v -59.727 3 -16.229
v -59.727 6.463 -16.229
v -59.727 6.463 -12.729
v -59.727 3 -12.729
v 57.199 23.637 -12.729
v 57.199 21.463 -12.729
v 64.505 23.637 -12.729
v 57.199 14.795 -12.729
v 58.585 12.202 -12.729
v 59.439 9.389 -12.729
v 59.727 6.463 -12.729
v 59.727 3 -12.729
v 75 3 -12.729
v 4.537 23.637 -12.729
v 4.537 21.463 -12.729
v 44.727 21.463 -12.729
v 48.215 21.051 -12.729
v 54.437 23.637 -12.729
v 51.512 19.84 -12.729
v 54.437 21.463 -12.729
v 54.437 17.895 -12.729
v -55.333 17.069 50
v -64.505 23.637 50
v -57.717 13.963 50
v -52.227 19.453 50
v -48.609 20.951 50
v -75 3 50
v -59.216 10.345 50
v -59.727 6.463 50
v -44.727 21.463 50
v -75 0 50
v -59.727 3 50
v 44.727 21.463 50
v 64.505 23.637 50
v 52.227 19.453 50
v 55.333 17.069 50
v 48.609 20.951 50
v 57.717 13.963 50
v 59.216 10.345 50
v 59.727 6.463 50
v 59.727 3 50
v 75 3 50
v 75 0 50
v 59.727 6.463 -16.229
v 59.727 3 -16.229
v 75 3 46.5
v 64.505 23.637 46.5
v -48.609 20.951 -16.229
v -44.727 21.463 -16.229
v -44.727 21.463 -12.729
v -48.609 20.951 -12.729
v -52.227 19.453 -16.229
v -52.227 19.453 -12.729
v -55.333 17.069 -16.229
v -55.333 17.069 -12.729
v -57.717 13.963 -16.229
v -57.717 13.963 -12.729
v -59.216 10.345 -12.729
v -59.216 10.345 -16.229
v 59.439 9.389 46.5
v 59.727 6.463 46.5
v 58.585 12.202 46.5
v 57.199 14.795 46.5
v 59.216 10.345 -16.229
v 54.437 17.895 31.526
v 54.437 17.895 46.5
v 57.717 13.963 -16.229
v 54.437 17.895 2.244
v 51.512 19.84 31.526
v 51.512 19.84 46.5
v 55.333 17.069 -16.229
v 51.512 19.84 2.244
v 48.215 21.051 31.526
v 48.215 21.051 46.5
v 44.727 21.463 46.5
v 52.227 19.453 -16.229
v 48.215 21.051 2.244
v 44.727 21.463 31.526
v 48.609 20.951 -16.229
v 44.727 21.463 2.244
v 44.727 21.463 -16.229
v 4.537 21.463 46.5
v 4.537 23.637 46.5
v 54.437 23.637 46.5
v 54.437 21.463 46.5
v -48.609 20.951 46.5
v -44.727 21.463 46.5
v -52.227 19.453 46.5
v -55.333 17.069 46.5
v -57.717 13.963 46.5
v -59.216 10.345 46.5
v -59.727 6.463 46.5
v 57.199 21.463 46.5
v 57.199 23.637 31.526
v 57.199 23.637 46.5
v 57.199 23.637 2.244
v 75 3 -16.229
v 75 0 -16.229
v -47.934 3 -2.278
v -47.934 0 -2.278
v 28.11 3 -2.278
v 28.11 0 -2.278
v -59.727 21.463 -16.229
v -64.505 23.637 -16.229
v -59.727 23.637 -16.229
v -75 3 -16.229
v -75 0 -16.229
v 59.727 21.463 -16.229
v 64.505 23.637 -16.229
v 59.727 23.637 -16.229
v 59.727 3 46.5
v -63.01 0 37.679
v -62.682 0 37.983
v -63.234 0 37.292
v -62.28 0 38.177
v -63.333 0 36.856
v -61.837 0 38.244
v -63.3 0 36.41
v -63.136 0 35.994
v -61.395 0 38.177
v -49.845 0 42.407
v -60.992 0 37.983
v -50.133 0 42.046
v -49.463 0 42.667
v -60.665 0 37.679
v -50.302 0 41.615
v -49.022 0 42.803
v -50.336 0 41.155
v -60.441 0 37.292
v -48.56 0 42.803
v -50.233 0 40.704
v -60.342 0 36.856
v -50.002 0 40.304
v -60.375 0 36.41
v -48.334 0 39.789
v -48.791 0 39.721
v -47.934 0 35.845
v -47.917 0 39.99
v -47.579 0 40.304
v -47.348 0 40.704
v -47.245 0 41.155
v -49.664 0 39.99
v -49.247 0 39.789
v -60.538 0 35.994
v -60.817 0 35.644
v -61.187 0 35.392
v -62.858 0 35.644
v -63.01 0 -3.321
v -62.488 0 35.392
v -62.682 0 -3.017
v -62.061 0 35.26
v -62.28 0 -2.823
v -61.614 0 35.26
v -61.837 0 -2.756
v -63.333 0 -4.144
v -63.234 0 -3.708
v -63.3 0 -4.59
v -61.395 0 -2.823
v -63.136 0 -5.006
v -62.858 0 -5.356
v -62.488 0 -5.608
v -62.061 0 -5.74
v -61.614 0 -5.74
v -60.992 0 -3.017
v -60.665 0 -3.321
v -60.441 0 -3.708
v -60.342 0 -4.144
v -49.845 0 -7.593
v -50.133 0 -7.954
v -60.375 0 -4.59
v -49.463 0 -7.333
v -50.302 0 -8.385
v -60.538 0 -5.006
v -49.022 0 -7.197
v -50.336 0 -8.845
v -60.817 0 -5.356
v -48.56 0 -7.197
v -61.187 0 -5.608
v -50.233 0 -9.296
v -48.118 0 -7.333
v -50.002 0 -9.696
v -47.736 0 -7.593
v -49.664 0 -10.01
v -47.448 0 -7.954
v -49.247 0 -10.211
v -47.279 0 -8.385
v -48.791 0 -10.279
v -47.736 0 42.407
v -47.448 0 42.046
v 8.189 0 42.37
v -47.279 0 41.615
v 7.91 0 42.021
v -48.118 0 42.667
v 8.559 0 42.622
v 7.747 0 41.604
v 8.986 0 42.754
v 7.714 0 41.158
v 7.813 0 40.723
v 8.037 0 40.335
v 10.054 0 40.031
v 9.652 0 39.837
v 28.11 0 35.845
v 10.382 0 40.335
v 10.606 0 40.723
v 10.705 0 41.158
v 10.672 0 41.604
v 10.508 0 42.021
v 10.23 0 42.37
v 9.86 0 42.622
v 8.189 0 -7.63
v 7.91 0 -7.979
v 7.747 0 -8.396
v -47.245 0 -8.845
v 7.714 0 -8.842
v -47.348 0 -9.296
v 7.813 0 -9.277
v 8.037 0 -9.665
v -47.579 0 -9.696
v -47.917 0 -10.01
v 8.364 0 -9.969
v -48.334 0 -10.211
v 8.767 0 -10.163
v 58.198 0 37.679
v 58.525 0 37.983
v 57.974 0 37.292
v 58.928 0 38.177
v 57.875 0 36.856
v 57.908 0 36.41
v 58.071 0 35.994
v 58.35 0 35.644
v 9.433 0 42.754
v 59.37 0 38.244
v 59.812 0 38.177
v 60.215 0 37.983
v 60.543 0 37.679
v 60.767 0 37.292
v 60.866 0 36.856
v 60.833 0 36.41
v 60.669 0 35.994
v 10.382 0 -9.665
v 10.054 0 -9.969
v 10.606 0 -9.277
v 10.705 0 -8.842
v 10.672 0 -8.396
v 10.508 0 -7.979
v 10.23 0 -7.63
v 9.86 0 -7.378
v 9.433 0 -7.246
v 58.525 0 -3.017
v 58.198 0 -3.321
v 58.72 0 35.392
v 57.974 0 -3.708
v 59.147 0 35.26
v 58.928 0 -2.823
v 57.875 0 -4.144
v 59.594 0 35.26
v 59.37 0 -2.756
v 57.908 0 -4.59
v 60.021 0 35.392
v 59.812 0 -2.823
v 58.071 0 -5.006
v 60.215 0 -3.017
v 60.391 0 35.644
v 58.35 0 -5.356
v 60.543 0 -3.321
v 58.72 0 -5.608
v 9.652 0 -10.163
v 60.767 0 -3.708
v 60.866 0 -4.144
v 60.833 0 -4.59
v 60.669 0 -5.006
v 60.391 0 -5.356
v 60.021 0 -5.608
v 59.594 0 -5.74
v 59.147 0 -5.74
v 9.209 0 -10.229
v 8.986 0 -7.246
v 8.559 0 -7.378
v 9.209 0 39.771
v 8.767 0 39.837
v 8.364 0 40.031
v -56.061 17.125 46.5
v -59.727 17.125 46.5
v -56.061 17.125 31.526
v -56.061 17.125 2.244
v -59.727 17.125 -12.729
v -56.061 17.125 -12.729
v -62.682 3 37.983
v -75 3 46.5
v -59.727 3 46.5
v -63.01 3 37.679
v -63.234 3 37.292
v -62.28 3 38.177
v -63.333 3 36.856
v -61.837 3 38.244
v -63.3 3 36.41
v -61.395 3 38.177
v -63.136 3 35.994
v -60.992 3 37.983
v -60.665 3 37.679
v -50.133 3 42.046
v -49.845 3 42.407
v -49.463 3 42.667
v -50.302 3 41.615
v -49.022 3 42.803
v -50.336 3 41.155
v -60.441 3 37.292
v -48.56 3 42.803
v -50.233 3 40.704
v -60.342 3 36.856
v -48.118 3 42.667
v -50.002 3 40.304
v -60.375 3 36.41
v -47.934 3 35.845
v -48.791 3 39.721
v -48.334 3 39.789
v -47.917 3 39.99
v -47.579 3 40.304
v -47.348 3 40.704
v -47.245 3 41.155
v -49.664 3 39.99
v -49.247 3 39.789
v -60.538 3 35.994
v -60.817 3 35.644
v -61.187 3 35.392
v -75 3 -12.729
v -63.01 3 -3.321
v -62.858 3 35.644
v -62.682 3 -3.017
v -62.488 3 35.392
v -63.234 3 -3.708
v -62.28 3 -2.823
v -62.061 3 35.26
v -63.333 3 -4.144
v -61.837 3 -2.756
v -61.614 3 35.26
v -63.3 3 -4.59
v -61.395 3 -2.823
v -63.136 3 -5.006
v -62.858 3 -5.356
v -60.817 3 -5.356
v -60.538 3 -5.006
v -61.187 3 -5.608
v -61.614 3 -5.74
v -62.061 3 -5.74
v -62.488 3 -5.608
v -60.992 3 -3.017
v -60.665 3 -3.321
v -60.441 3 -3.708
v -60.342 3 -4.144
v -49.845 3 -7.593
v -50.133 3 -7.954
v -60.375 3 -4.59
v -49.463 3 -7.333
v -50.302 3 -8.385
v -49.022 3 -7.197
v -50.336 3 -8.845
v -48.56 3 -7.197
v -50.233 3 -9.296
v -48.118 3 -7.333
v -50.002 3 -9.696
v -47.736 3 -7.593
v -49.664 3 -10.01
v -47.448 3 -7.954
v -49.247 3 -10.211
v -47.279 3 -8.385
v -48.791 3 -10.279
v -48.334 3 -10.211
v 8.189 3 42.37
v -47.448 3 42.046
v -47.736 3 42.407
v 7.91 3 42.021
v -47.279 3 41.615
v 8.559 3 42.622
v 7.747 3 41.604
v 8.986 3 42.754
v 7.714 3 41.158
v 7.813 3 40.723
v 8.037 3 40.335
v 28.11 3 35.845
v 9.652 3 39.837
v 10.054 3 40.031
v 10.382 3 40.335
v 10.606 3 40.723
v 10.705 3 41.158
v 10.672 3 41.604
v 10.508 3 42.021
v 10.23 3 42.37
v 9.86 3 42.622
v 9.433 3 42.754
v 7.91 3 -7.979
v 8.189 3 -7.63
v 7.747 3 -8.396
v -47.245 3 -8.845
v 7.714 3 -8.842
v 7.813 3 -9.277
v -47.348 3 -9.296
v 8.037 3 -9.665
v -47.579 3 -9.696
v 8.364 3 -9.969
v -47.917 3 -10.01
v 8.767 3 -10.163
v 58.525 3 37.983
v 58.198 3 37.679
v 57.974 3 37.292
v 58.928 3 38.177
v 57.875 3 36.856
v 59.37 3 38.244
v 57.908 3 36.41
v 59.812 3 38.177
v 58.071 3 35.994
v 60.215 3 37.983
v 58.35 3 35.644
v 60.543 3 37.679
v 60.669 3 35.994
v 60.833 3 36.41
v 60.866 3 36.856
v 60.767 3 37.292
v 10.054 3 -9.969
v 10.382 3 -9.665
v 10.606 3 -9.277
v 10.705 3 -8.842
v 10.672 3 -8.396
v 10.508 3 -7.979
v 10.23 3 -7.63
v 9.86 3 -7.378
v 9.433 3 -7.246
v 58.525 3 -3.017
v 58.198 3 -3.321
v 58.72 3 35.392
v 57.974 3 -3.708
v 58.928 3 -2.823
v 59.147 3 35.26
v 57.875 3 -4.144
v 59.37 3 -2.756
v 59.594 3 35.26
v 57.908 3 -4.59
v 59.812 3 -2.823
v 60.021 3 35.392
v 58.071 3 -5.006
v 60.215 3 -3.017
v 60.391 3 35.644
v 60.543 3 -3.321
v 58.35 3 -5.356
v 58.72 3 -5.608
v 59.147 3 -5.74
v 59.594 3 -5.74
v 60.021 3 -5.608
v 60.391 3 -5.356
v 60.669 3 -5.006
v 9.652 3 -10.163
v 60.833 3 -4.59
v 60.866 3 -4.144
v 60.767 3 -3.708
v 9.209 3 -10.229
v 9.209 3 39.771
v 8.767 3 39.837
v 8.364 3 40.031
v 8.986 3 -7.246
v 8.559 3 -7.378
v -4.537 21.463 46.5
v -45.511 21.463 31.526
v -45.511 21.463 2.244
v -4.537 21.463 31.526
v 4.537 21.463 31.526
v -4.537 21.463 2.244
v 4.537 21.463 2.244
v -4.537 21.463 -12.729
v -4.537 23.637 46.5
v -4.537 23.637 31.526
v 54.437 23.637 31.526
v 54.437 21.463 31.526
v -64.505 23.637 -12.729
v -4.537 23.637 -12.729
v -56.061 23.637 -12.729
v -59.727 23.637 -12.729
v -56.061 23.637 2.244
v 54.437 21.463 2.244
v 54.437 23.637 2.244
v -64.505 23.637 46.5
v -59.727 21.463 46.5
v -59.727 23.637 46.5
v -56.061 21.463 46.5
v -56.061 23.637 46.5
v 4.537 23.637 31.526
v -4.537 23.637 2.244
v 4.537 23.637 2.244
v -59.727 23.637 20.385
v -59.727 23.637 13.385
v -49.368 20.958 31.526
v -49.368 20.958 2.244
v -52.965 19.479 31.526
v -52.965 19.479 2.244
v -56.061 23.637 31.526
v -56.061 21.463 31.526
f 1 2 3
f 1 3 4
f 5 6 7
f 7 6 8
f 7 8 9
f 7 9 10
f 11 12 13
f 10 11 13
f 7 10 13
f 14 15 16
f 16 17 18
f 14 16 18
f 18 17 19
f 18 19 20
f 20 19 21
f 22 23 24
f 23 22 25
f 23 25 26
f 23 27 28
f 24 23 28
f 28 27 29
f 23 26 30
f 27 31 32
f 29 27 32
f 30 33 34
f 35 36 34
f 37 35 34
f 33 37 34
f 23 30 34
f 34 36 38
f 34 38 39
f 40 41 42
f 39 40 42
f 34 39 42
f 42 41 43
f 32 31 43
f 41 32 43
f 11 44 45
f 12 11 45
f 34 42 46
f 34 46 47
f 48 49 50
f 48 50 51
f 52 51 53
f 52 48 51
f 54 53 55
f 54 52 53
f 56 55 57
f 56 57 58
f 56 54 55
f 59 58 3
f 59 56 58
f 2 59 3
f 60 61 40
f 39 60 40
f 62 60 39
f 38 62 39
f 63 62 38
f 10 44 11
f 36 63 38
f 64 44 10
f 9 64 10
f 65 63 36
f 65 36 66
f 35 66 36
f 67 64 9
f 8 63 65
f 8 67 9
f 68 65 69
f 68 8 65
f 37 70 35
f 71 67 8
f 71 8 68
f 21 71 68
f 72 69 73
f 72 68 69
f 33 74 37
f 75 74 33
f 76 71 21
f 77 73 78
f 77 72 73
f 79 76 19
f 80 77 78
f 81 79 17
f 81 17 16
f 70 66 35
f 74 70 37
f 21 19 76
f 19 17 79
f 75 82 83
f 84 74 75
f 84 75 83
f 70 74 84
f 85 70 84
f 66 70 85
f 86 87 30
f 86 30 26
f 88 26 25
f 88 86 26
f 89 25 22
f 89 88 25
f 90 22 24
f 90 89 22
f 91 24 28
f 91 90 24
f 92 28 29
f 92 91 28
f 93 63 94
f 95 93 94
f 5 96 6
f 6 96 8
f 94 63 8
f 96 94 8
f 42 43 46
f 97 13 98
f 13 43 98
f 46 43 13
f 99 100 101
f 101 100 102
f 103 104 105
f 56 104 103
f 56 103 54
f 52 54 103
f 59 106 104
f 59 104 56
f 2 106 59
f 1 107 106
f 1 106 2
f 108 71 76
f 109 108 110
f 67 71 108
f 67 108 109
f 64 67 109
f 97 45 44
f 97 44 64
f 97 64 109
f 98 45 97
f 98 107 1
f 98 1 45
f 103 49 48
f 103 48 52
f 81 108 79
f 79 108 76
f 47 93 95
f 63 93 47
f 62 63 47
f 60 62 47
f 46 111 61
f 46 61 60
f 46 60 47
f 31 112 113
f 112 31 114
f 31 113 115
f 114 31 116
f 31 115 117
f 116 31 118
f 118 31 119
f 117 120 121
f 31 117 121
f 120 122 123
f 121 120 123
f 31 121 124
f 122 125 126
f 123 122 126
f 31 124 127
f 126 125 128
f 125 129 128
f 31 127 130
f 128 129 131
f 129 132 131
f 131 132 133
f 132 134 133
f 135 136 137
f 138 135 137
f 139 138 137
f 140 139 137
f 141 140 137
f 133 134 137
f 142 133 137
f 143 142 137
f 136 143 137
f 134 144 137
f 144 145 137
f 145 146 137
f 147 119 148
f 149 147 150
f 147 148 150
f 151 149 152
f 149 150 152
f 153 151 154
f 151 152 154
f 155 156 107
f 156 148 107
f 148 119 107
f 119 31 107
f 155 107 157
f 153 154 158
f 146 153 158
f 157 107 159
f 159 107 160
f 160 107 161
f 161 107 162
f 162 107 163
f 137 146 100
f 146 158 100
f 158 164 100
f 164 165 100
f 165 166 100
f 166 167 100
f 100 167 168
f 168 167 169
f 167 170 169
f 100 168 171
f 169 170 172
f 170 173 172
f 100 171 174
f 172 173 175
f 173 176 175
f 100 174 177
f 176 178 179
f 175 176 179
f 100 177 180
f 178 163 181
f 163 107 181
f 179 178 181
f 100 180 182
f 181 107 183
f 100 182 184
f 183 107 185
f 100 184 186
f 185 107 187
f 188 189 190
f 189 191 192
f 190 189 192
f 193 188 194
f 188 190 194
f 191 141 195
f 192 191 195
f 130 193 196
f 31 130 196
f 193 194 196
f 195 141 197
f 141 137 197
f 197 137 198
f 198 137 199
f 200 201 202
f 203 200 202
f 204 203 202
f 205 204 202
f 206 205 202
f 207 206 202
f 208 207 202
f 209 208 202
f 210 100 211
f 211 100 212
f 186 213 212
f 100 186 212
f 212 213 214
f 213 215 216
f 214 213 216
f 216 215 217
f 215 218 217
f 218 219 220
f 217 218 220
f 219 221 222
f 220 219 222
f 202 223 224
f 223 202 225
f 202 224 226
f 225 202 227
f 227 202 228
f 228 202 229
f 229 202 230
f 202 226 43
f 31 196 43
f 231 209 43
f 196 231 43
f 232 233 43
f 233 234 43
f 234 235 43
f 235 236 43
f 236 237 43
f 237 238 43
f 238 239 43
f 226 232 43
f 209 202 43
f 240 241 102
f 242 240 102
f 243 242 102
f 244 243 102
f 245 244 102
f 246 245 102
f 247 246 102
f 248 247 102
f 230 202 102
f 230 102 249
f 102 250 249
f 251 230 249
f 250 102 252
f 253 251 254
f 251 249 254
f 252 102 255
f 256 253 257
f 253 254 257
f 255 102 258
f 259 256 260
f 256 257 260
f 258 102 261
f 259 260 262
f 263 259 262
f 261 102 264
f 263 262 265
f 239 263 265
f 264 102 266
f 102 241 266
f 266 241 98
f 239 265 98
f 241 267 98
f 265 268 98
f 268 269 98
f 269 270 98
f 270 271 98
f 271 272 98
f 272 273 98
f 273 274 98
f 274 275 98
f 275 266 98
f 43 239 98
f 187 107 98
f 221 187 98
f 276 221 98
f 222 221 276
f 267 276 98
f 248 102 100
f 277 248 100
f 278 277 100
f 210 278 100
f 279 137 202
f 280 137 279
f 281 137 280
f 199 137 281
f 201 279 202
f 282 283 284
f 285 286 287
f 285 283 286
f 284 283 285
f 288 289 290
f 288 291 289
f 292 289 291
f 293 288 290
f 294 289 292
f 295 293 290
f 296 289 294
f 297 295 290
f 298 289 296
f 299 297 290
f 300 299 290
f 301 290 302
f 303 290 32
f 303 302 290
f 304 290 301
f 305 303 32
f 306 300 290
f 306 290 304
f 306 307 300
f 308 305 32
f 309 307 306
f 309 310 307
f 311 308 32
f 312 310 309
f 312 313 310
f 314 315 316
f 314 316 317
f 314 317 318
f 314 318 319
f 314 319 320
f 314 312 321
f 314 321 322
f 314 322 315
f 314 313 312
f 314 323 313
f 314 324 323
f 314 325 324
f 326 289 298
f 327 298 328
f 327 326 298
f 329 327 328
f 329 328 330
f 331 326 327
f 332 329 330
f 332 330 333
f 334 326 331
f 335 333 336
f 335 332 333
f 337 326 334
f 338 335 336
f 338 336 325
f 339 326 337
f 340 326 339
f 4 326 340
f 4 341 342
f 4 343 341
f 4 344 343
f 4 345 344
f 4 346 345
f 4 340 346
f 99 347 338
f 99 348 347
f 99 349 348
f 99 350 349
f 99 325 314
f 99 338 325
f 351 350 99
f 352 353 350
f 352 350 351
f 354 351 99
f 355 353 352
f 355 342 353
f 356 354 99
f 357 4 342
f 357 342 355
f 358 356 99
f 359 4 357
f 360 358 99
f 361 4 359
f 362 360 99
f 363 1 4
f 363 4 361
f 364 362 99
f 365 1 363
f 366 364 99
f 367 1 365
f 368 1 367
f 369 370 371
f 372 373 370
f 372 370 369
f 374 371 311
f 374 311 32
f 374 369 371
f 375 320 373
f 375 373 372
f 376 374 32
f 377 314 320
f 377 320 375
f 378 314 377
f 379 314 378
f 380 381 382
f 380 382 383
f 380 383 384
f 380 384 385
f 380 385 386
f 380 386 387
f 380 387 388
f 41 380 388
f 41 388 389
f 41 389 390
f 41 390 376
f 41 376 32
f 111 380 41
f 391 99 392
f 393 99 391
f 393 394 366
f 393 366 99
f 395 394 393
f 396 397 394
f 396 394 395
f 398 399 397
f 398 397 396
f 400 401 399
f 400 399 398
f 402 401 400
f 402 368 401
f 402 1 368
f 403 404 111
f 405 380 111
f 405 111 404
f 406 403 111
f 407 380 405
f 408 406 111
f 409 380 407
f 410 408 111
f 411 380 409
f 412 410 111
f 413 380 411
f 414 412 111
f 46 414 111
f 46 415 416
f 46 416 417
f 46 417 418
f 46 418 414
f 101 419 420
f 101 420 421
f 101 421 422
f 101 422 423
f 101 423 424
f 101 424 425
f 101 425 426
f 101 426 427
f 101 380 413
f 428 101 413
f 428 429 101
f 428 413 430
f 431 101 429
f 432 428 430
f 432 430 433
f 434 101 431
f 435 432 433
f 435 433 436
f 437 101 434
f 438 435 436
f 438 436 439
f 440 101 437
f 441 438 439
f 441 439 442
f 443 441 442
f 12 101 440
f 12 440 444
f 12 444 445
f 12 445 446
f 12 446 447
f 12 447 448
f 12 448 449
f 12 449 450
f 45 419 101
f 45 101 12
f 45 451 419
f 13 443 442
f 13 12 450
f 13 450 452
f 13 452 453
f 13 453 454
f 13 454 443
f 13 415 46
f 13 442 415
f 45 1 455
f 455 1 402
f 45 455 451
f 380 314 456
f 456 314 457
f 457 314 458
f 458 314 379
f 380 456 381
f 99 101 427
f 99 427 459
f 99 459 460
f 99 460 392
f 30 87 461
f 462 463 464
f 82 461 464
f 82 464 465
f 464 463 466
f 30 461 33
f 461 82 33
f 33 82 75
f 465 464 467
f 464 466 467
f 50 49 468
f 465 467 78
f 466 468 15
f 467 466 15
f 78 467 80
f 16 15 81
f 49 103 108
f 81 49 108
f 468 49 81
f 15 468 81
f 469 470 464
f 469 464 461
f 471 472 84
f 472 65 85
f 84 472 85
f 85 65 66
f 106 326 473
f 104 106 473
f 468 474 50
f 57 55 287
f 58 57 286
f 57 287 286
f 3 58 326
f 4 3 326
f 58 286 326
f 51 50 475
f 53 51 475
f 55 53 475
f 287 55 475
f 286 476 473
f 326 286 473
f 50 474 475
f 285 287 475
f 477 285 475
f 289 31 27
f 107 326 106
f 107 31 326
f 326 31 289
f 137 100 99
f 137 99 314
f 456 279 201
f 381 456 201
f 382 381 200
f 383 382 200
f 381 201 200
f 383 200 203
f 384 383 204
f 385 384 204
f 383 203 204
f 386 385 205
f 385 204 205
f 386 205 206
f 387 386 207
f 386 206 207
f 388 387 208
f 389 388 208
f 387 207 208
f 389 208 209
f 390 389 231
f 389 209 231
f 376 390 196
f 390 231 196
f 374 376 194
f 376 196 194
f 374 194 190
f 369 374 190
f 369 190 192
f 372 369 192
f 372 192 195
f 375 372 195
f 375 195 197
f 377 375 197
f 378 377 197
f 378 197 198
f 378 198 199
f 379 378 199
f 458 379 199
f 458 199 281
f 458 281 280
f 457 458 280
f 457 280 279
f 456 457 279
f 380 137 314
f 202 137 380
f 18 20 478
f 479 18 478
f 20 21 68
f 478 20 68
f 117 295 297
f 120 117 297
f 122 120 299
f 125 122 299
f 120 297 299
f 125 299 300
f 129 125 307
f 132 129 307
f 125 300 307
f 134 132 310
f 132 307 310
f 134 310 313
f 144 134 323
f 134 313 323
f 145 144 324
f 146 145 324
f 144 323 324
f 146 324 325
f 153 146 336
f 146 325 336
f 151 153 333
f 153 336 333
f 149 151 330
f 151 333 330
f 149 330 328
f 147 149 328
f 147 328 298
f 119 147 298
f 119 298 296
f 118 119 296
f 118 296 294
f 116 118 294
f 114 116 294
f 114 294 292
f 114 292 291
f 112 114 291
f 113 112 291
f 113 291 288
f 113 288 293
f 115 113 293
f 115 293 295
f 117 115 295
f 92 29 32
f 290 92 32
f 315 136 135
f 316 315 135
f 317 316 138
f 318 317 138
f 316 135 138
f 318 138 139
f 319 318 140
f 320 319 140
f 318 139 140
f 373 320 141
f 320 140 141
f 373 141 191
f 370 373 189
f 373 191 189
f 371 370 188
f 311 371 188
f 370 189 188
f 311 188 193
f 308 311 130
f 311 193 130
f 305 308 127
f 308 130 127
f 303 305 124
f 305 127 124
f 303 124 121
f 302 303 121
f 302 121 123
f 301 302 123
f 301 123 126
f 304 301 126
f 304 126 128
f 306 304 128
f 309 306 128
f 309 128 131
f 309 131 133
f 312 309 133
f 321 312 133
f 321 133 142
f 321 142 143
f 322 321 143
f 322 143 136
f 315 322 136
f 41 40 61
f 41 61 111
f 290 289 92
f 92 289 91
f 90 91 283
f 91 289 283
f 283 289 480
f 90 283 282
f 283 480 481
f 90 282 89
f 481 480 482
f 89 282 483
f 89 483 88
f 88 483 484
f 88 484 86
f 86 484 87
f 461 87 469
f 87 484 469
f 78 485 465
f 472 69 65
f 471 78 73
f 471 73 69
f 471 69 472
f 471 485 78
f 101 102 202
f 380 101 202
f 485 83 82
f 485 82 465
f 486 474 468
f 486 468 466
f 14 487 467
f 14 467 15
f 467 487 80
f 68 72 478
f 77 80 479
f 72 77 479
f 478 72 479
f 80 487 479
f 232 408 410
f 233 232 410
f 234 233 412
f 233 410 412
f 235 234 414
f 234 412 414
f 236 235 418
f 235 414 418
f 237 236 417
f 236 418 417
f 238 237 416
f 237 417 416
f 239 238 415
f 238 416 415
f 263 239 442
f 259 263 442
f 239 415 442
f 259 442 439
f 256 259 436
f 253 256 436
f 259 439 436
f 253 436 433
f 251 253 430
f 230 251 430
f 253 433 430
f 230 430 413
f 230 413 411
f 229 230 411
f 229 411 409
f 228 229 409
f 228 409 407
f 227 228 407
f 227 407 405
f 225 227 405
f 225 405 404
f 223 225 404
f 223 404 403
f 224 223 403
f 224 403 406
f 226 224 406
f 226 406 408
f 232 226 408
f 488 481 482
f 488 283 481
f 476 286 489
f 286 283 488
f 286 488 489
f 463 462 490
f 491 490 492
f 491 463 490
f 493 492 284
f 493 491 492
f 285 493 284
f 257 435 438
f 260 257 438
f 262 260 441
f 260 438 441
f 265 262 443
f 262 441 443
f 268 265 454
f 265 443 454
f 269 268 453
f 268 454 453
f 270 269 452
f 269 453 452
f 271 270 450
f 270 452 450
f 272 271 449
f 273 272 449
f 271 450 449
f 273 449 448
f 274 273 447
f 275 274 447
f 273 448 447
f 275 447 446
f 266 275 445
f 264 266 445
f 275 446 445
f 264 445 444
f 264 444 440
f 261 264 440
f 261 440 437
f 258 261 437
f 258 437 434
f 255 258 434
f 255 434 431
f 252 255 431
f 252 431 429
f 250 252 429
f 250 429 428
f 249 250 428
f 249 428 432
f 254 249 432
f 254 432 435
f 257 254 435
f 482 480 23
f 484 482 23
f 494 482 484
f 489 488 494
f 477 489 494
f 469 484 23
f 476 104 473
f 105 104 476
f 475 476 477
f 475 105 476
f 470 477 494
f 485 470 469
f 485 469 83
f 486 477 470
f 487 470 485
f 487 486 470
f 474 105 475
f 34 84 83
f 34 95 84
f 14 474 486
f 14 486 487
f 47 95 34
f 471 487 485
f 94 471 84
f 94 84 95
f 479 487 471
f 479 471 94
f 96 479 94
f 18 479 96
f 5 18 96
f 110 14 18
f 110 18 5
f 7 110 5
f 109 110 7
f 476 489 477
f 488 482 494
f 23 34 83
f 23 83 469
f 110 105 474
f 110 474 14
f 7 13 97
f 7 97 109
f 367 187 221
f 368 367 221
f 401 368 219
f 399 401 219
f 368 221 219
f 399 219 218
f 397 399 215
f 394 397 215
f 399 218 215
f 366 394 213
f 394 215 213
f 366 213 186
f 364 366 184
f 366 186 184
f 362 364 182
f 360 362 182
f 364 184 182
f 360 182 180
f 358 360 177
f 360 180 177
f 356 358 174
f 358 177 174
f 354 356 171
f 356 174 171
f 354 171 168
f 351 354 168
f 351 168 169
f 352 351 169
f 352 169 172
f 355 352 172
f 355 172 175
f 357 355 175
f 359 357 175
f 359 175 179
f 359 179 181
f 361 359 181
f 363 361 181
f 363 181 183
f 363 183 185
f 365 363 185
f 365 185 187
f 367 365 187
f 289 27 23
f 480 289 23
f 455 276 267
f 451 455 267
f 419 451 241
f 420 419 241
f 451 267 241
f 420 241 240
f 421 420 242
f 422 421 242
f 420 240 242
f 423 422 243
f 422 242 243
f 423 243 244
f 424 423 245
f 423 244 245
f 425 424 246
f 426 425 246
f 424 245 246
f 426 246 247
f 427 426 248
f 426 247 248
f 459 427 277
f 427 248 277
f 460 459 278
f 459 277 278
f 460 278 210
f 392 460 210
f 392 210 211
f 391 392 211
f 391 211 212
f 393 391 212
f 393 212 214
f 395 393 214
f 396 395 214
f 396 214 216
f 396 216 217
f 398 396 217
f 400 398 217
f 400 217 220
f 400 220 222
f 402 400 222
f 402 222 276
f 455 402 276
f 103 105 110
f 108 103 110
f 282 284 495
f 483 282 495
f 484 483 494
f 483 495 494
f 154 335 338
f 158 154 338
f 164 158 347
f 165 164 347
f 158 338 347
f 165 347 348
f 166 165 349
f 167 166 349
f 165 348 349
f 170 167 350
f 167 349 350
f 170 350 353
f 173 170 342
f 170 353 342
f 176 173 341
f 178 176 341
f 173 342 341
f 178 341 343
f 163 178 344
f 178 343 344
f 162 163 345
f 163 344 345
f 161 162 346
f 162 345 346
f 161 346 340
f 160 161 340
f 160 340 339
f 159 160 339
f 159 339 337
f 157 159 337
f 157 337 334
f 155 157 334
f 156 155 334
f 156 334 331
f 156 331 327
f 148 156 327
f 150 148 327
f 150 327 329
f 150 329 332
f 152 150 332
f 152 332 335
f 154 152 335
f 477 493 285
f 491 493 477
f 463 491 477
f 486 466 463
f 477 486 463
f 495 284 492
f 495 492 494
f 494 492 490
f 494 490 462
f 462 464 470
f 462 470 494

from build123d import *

# Parameters (mm, degrees)
SKETCH_1_W               = 150
SKETCH_1_H               = 100
EXTRUDE_1_DEPTH          = 3
CUT_EXTRUDE_1_DEPTH      = 10
SKETCH_4_R               = 1.5
CUT_EXTRUDE_2_DEPTH      = 10
CUT_EXTRUDE_3_DEPTH      = 10
EXTRUDE_2_REACH          = 102.102
CUT_EXTRUDE_4_DEPTH      = 214
CUT_EXTRUDE_4_DEPTH_BACK = 24
SKETCH_8_W               = 26.114706757
SKETCH_8_H               = 20.636533531
SKETCH_11_R              = 1.55
SKETCH_11_R_2            = 1.5
CUT_EXTRUDE_5_DEPTH      = 27
EXTRUDE_START            = -66.229414
SKETCH_12_W              = 119.453449028
SKETCH_12_H              = 2.174025896
EXTRUDE_3_DEPTH          = 66.229414
EXTRUDE_START_2          = -2.174026
SKETCH_13_W              = 4.778137961
SKETCH_13_H              = 26.114706757
EXTRUDE_4_DEPTH          = 2.174026
CUT_EXTRUDE_6_DEPTH      = 2.174025896
CUT_EXTRUDE_8_DEPTH      = 7
SKETCH_18_W              = 4.778137961
SKETCH_18_H              = 2.174025896
CUT_EXTRUDE_9_DEPTH      = 29.282146497
SKETCH_19_W              = 3.665528499
SKETCH_19_H              = 2.174025896
EXTRUDE_7_DEPTH          = 59.229414
SKETCH_20_W              = 2.762304407
SKETCH_20_H              = 14.973633508
EXTRUDE_8_DEPTH          = 2.174025896
SKETCH_21_W              = 4.846380184
SKETCH_21_H              = 29.282146498
CUT_EXTRUDE_10_DEPTH     = 2.174025896
FILLET_3_R               = 15
SKETCH_22_W              = 3.665528499
SKETCH_22_H              = 4.33713538
EXTRUDE_9_DEPTH          = 59.229413514
FILLET_4_R               = 15
SKETCH_23_W              = 76.043557339
SKETCH_23_H              = 38.123441179
CUT_EXTRUDE_11_DEPTH     = 8


with BuildPart() as part:
    # 草图1 → 凸台-拉伸1 (new body)
    with BuildSketch(Plane(origin=(0, 0, 0), x_dir=(1, 0, 0), z_dir=(0, 1, 0))):
        Rectangle(SKETCH_1_W, SKETCH_1_H)
    extrude(amount=EXTRUDE_1_DEPTH)

    # 草图2 → 切除-拉伸1 (cut)
    with BuildSketch(Plane(origin=(0, 3, 0), x_dir=(1, 0, 0), z_dir=(0, 1, 0))):
        Polygon((-75, 25.450950707), (82.438645769, 25.450950707), (82.438645769, 50), (45.243784289, 69.01769232), (-35.190103662, 62.508591561), (-89.149345597, 58.141947705), align=None)
    extrude(amount=-CUT_EXTRUDE_1_DEPTH, mode=Mode.SUBTRACT)

    # 草图4 → 切除-拉伸2 (cut)
    with BuildSketch(Plane(origin=(0, 3, 0), x_dir=(1, 0, 0), z_dir=(0, 1, 0))):
        with Locations(Location((59.370364421, 4.256376577, 0), (0, 0, 270))):
            Circle(SKETCH_4_R)
        with Locations(Location((59.370364421, -36.743623423, 0), (0, 0, 270))):
            Circle(SKETCH_4_R)
        with Locations(Location((-61.837405042, -36.743623423, 0), (0, 0, 270))):
            Circle(SKETCH_4_R)
        with Locations(Location((-61.837405042, 4.256376577, 0), (0, 0, 270))):
            Circle(SKETCH_4_R)
    extrude(amount=-CUT_EXTRUDE_2_DEPTH, mode=Mode.SUBTRACT)

    # 草图5 → 切除-拉伸3 (cut)
    with BuildSketch(Plane(origin=(0, 3, 0), x_dir=(1, 0, 0), z_dir=(0, 1, 0))):
        Polygon((-75, 16.229413514), (82.270873699, 16.229413514), (82.270873699, 33.668010185), (-81.615992849, 33.668010185), (-81.615992849, 16.229413514), align=None)
    extrude(amount=-CUT_EXTRUDE_3_DEPTH, mode=Mode.SUBTRACT)

    # 凸台-拉伸2: up to this face of the body (flat: up to its plane)
    extrude_2_end = Plane(part.part.faces().sort_by_distance((0, 1.5, -16.229413514))[0])
    # 草图6 → 凸台-拉伸2 (add, up to the picked face)
    with BuildSketch(Plane.XY.offset(50), mode=Mode.PRIVATE) as extrude_2_sk1:
        Polygon((-75, 3), (-64.504862475, 23.636533531), (-59.726724514, 23.636533531), (-59.726724514, 3), align=None)
    extrude_2_tool1 = split(extrude(extrude_2_sk1.sketch, amount=-EXTRUDE_2_REACH, mode=Mode.PRIVATE), bisect_by=extrude_2_end, keep=Keep.BOTH, mode=Mode.PRIVATE)
    # 草图6 → 凸台-拉伸2 (add, up to the picked face)
    with BuildSketch(Plane.XY.offset(50), mode=Mode.PRIVATE) as extrude_2_sk2:
        Polygon((59.726724514, 23.636533531), (59.726724514, 3), (75, 3), (64.504862475, 23.636533531), align=None)
    extrude_2_tool2 = split(extrude(extrude_2_sk2.sketch, amount=-EXTRUDE_2_REACH, mode=Mode.PRIVATE), bisect_by=extrude_2_end, keep=Keep.BOTH, mode=Mode.PRIVATE)
    add(extrude_2_tool1.solids().sort_by(Axis((-65.197351, 11.518034, 50), (0, 0, -1)))[0])
    add(extrude_2_tool2.solids().sort_by(Axis((65.197351, 11.518034, 50), (0, 0, -1)))[0])

    # 草图8 → 切除-拉伸4 (cut, two sides: drawn at the far end of the back side and taken through both)
    with BuildSketch(Plane.ZY.offset(-59.726724514).offset(-CUT_EXTRUDE_4_DEPTH_BACK)):
        with Locations((0.327939865, 13.318266766)):
            Rectangle(SKETCH_8_W, SKETCH_8_H)
        with Locations((33.442646622, 13.318266766)):
            Rectangle(SKETCH_8_W, SKETCH_8_H)
    extrude(amount=CUT_EXTRUDE_4_DEPTH + CUT_EXTRUDE_4_DEPTH_BACK, mode=Mode.SUBTRACT)

    # 草图11 → 切除-拉伸5 (cut)
    with BuildSketch(Plane.XZ):
        with Locations(Location((-48.790619751, 41.270586486, 0), (0, 0, 270))):
            Circle(SKETCH_11_R)
        with Locations(Location((9.209380249, 41.270586486, 0), (0, 0, 270))):
            Circle(SKETCH_11_R_2)
        with Locations(Location((-48.790619751, -8.729413514, 0), (0, 0, 270))):
            Circle(SKETCH_11_R)
        with Locations(Location((9.209380249, -8.729413514, 0), (0, 0, 270))):
            Circle(SKETCH_11_R_2)
    extrude(amount=-CUT_EXTRUDE_5_DEPTH, mode=Mode.SUBTRACT)

    # 草图12 → 凸台-拉伸3 (add)
    with BuildSketch(Plane.XY.offset(50).offset(EXTRUDE_START)):
        with Locations((0, 22.549520583)):
            Rectangle(SKETCH_12_W, SKETCH_12_H)
    extrude(amount=EXTRUDE_3_DEPTH)

    # 草图13 → 凸台-拉伸4 (add)
    with BuildSketch(Plane(origin=(0, 23.636533531, 0), x_dir=(1, 0, 0), z_dir=(0, 1, 0)).offset(EXTRUDE_START_2)):
        with Locations((-62.115793495, -0.327939865)):
            Rectangle(SKETCH_13_W, SKETCH_13_H)
        with Locations((-62.115793495, -33.442646622)):
            Rectangle(SKETCH_13_W, SKETCH_13_H)
        with Locations((62.115793495, -33.442646622)):
            Rectangle(SKETCH_13_W, SKETCH_13_H)
        with Locations((62.115793495, -0.327939865)):
            Rectangle(SKETCH_13_W, SKETCH_13_H)
    extrude(amount=EXTRUDE_4_DEPTH)

    # 草图14 → 切除-拉伸6 (cut)
    with BuildSketch(Plane(origin=(0, 23.636533531, 0), x_dir=(1, 0, 0), z_dir=(0, 1, 0))):
        Polygon((-59.726724514, 12.729413514), (-4.537128548, 12.729413514), (-4.537128548, -2.244219994), (-64.504862475, -2.244219994), (-64.504862475, 12.729413514), align=None)
        Polygon((64.504862475, -2.244219994), (4.537128548, -2.244219994), (4.537128548, 12.729413514), (59.726724514, 12.729413514), (64.504862475, 12.729413514), align=None)
        Polygon((59.726724514, -46.5), (4.537128548, -46.5), (4.537128548, -31.526366492), (64.504862475, -31.526366492), (64.504862475, -46.5), align=None)
        Polygon((-64.504862475, -31.526366492), (-4.537128548, -31.526366492), (-4.537128548, -46.5), (-59.726724514, -46.5), (-64.504862475, -46.5), align=None)
    extrude(amount=-CUT_EXTRUDE_6_DEPTH, mode=Mode.SUBTRACT)

    # 草图16 → 切除-拉伸8 (cut)
    with BuildSketch(Plane.XY.offset(20.385293243)):
        Polygon((-64.504862475, 23.636533531), (-75, 3), (-59.726724514, 3), (-59.726724514, 23.636533531), align=None)
        Polygon((59.726724514, 23.636533531), (64.504862475, 23.636533531), (75, 3), (59.726724514, 3), align=None)
    extrude(amount=-CUT_EXTRUDE_8_DEPTH, mode=Mode.SUBTRACT)

    # 草图18 → 切除-拉伸9 (cut)
    with BuildSketch(Plane.XY.offset(31.526366492)):
        with Locations((-62.115793495, 22.549520583)):
            Rectangle(SKETCH_18_W, SKETCH_18_H)
        with Locations((62.115793495, 22.549520583)):
            Rectangle(SKETCH_18_W, SKETCH_18_H)
    extrude(amount=-CUT_EXTRUDE_9_DEPTH, mode=Mode.SUBTRACT)

    # 草图19 → 凸台-拉伸7 (add)
    with BuildSketch(Plane.XY.offset(-12.729413514)):
        with Locations((-57.893960265, 22.549520583)):
            Rectangle(SKETCH_19_W, SKETCH_19_H)
    extrude(amount=EXTRUDE_7_DEPTH)

    # 草图20 → 凸台-拉伸8 (add)
    with BuildSketch(Plane(origin=(0, 23.636533531, 0), x_dir=(1, 0, 0), z_dir=(0, 1, 0))):
        with Locations((55.818072582, 5.24259676)):
            Rectangle(SKETCH_20_W, SKETCH_20_H)
        with Locations((55.818072582, -39.013183246)):
            Rectangle(SKETCH_20_W, SKETCH_20_H)
    extrude(amount=-EXTRUDE_8_DEPTH)

    # 草图21 → 切除-拉伸10 (cut)
    with BuildSketch(Plane(origin=(0, 23.636533531, 0), x_dir=(1, 0, 0), z_dir=(0, 1, 0))):
        with Locations((59.622414877, -16.885293243)):
            Rectangle(SKETCH_21_W, SKETCH_21_H)
    extrude(amount=-CUT_EXTRUDE_10_DEPTH, mode=Mode.SUBTRACT)

    # 圆角3
    # the kernel refuses this fillet: 15 mm, written as the material it adds along each edge
    with BuildSketch(Plane(origin=(-59.726724514, 21.462507635, 9.000000486), x_dir=(1, 0, 0), z_dir=(0, 0, 1))) as fillet_3_piece_1_section:
        with BuildLine():
            CenterArc((FILLET_3_R, -FILLET_3_R), FILLET_3_R, 90, 90)
            Line((0, -FILLET_3_R), (0, 0))
            Line((0, 0), (FILLET_3_R, 0))
        make_face()
    fillet_3_piece_1 = extrude(amount=40.999999514, mode=Mode.PRIVATE)
    fillet_3_piece_1 = split(fillet_3_piece_1, bisect_by=Plane(origin=(-53.334627801, 19.96988212, 46.5), z_dir=(0, 0, 1)), keep=Keep.TOP, mode=Mode.PRIVATE)
    add(fillet_3_piece_1)
    with BuildSketch(Plane(origin=(-59.726724514, 21.462507635, -16.229413514), x_dir=(1, 0, 0), z_dir=(0, 0, 1))) as fillet_3_piece_2:
        with BuildLine():
            CenterArc((FILLET_3_R, -FILLET_3_R), FILLET_3_R, 90, 90)
            Line((0, -FILLET_3_R), (0, 0))
            Line((0, 0), (FILLET_3_R, 0))
        make_face()
    extrude(amount=3.5)
    with BuildSketch(Plane(origin=(59.726724514, 21.462507635, -16.229413514), x_dir=(-1, 0, 0), z_dir=(0, 0, 1)), Plane(origin=(59.726724514, 21.462507635, 46.5), x_dir=(-1, 0, 0), z_dir=(0, 0, 1))) as fillet_3_piece_3:
        with BuildLine():
            CenterArc((FILLET_3_R, FILLET_3_R), FILLET_3_R, 180, 90)
            Line((0, FILLET_3_R), (0, 0))
            Line((0, 0), (FILLET_3_R, 0))
        make_face()
    extrude(amount=3.5)
    with BuildSketch(Plane(origin=(59.726724514, 21.462507635, -16.229413514), x_dir=(-1, 0, 0), z_dir=(0, 0, 1))) as fillet_3_piece_4_section:
        with BuildLine():
            CenterArc((FILLET_3_R, FILLET_3_R), FILLET_3_R, 180, 90)
            Line((0, FILLET_3_R), (0, 0))
            Line((0, 0), (FILLET_3_R, 0))
        make_face()
    fillet_3_piece_4 = extrude(amount=41, mode=Mode.PRIVATE)
    fillet_3_piece_4 = split(fillet_3_piece_4, bisect_by=Plane(origin=(54.436920378, 18.896822282, -5.24259676), z_dir=(1, 0, 0)), keep=Keep.TOP, mode=Mode.PRIVATE)
    fillet_3_piece_4 = split(fillet_3_piece_4, bisect_by=Plane(origin=(57.199224785, 18.896822282, -5.24259676), z_dir=(-1, 0, 0)), keep=Keep.TOP, mode=Mode.PRIVATE)
    add(fillet_3_piece_4)
    with BuildSketch(Plane(origin=(59.726724514, 21.462507635, -53.729413514), x_dir=(-1, 0, 0), z_dir=(0, 0, 1))) as fillet_3_piece_5_section:
        with BuildLine():
            CenterArc((FILLET_3_R, FILLET_3_R), FILLET_3_R, 180, 90)
            Line((0, FILLET_3_R), (0, 0))
            Line((0, 0), (FILLET_3_R, 0))
        make_face()
    fillet_3_piece_5 = extrude(amount=78.5, mode=Mode.PRIVATE)
    fillet_3_piece_5 = split(fillet_3_piece_5, bisect_by=Plane(origin=(52.070892236, 20.41839557, 2.244219994), z_dir=(0, 0, 1)), keep=Keep.TOP, mode=Mode.PRIVATE)
    fillet_3_piece_5 = split(fillet_3_piece_5, bisect_by=Plane(origin=(57.199224785, 20.41839557, 13.50740324), z_dir=(-1, 0, 0)), keep=Keep.TOP, mode=Mode.PRIVATE)
    add(fillet_3_piece_5)
    with BuildSketch(Plane(origin=(59.726724514, 21.462507635, 9), x_dir=(-1, 0, 0), z_dir=(0, 0, 1))) as fillet_3_piece_6_section:
        with BuildLine():
            CenterArc((FILLET_3_R, FILLET_3_R), FILLET_3_R, 180, 90)
            Line((0, FILLET_3_R), (0, 0))
            Line((0, 0), (FILLET_3_R, 0))
        make_face()
    fillet_3_piece_6 = extrude(amount=78.5, mode=Mode.PRIVATE)
    fillet_3_piece_6 = split(fillet_3_piece_6, bisect_by=Plane(origin=(52.070892236, 20.41839557, 31.526366492), z_dir=(0, 0, -1)), keep=Keep.TOP, mode=Mode.PRIVATE)
    fillet_3_piece_6 = split(fillet_3_piece_6, bisect_by=Plane(origin=(57.199224785, 20.41839557, 20.263183246), z_dir=(-1, 0, 0)), keep=Keep.TOP, mode=Mode.PRIVATE)
    add(fillet_3_piece_6)
    with BuildSketch(Plane(origin=(59.726724514, 21.462507635, 9), x_dir=(-1, 0, 0), z_dir=(0, 0, 1))) as fillet_3_piece_7_section:
        with BuildLine():
            CenterArc((FILLET_3_R, FILLET_3_R), FILLET_3_R, 180, 90)
            Line((0, FILLET_3_R), (0, 0))
            Line((0, 0), (FILLET_3_R, 0))
        make_face()
    fillet_3_piece_7 = extrude(amount=41, mode=Mode.PRIVATE)
    fillet_3_piece_7 = split(fillet_3_piece_7, bisect_by=Plane(origin=(54.436920378, 18.896822282, 39.013183246), z_dir=(1, 0, 0)), keep=Keep.TOP, mode=Mode.PRIVATE)
    fillet_3_piece_7 = split(fillet_3_piece_7, bisect_by=Plane(origin=(57.199224785, 18.896822282, 39.013183246), z_dir=(-1, 0, 0)), keep=Keep.TOP, mode=Mode.PRIVATE)
    add(fillet_3_piece_7)

    # 草图22 → 凸台-拉伸9 (add)
    with BuildSketch(Plane.XY.offset(-12.729413514)):
        with Locations((-57.893960265, 19.293939945)):
            Rectangle(SKETCH_22_W, SKETCH_22_H)
    extrude(amount=EXTRUDE_9_DEPTH)

    # 圆角4
    # the kernel refuses this fillet: 15 mm, written as the material it adds along each edge
    with BuildSketch(Plane(origin=(-56.061196015, 21.462507635, 2.244219994), x_dir=(0, -1, 0), z_dir=(0, 0, 1))) as fillet_4_piece_1:
        with BuildLine():
            CenterArc((15, 10.550038772), FILLET_4_R, 180, 44.695261707)
            Line((0, 10.550038772), (-0.3, 10.550038772))
            Line((-0.3, 10.550038772), (-0.3, 0))
            Line((-0.3, 0), (0, -0.3))
            ThreePointArc((0, -0.3), (2.16856769, -0.3), (4.123878087, -0.211000775))
            Line((4.123878087, -0.211000775), (4.33713538, 0))
        make_face()
    extrude(amount=29.282146497)

    # 草图23 → 切除-拉伸11 (cut)
    with BuildSketch(Plane.XZ):
        with Locations((-9.912094706, 16.783630734)):
            Rectangle(SKETCH_23_W, SKETCH_23_H)
    extrude(amount=-CUT_EXTRUDE_11_DEPTH, mode=Mode.SUBTRACT)


solid = part.part
